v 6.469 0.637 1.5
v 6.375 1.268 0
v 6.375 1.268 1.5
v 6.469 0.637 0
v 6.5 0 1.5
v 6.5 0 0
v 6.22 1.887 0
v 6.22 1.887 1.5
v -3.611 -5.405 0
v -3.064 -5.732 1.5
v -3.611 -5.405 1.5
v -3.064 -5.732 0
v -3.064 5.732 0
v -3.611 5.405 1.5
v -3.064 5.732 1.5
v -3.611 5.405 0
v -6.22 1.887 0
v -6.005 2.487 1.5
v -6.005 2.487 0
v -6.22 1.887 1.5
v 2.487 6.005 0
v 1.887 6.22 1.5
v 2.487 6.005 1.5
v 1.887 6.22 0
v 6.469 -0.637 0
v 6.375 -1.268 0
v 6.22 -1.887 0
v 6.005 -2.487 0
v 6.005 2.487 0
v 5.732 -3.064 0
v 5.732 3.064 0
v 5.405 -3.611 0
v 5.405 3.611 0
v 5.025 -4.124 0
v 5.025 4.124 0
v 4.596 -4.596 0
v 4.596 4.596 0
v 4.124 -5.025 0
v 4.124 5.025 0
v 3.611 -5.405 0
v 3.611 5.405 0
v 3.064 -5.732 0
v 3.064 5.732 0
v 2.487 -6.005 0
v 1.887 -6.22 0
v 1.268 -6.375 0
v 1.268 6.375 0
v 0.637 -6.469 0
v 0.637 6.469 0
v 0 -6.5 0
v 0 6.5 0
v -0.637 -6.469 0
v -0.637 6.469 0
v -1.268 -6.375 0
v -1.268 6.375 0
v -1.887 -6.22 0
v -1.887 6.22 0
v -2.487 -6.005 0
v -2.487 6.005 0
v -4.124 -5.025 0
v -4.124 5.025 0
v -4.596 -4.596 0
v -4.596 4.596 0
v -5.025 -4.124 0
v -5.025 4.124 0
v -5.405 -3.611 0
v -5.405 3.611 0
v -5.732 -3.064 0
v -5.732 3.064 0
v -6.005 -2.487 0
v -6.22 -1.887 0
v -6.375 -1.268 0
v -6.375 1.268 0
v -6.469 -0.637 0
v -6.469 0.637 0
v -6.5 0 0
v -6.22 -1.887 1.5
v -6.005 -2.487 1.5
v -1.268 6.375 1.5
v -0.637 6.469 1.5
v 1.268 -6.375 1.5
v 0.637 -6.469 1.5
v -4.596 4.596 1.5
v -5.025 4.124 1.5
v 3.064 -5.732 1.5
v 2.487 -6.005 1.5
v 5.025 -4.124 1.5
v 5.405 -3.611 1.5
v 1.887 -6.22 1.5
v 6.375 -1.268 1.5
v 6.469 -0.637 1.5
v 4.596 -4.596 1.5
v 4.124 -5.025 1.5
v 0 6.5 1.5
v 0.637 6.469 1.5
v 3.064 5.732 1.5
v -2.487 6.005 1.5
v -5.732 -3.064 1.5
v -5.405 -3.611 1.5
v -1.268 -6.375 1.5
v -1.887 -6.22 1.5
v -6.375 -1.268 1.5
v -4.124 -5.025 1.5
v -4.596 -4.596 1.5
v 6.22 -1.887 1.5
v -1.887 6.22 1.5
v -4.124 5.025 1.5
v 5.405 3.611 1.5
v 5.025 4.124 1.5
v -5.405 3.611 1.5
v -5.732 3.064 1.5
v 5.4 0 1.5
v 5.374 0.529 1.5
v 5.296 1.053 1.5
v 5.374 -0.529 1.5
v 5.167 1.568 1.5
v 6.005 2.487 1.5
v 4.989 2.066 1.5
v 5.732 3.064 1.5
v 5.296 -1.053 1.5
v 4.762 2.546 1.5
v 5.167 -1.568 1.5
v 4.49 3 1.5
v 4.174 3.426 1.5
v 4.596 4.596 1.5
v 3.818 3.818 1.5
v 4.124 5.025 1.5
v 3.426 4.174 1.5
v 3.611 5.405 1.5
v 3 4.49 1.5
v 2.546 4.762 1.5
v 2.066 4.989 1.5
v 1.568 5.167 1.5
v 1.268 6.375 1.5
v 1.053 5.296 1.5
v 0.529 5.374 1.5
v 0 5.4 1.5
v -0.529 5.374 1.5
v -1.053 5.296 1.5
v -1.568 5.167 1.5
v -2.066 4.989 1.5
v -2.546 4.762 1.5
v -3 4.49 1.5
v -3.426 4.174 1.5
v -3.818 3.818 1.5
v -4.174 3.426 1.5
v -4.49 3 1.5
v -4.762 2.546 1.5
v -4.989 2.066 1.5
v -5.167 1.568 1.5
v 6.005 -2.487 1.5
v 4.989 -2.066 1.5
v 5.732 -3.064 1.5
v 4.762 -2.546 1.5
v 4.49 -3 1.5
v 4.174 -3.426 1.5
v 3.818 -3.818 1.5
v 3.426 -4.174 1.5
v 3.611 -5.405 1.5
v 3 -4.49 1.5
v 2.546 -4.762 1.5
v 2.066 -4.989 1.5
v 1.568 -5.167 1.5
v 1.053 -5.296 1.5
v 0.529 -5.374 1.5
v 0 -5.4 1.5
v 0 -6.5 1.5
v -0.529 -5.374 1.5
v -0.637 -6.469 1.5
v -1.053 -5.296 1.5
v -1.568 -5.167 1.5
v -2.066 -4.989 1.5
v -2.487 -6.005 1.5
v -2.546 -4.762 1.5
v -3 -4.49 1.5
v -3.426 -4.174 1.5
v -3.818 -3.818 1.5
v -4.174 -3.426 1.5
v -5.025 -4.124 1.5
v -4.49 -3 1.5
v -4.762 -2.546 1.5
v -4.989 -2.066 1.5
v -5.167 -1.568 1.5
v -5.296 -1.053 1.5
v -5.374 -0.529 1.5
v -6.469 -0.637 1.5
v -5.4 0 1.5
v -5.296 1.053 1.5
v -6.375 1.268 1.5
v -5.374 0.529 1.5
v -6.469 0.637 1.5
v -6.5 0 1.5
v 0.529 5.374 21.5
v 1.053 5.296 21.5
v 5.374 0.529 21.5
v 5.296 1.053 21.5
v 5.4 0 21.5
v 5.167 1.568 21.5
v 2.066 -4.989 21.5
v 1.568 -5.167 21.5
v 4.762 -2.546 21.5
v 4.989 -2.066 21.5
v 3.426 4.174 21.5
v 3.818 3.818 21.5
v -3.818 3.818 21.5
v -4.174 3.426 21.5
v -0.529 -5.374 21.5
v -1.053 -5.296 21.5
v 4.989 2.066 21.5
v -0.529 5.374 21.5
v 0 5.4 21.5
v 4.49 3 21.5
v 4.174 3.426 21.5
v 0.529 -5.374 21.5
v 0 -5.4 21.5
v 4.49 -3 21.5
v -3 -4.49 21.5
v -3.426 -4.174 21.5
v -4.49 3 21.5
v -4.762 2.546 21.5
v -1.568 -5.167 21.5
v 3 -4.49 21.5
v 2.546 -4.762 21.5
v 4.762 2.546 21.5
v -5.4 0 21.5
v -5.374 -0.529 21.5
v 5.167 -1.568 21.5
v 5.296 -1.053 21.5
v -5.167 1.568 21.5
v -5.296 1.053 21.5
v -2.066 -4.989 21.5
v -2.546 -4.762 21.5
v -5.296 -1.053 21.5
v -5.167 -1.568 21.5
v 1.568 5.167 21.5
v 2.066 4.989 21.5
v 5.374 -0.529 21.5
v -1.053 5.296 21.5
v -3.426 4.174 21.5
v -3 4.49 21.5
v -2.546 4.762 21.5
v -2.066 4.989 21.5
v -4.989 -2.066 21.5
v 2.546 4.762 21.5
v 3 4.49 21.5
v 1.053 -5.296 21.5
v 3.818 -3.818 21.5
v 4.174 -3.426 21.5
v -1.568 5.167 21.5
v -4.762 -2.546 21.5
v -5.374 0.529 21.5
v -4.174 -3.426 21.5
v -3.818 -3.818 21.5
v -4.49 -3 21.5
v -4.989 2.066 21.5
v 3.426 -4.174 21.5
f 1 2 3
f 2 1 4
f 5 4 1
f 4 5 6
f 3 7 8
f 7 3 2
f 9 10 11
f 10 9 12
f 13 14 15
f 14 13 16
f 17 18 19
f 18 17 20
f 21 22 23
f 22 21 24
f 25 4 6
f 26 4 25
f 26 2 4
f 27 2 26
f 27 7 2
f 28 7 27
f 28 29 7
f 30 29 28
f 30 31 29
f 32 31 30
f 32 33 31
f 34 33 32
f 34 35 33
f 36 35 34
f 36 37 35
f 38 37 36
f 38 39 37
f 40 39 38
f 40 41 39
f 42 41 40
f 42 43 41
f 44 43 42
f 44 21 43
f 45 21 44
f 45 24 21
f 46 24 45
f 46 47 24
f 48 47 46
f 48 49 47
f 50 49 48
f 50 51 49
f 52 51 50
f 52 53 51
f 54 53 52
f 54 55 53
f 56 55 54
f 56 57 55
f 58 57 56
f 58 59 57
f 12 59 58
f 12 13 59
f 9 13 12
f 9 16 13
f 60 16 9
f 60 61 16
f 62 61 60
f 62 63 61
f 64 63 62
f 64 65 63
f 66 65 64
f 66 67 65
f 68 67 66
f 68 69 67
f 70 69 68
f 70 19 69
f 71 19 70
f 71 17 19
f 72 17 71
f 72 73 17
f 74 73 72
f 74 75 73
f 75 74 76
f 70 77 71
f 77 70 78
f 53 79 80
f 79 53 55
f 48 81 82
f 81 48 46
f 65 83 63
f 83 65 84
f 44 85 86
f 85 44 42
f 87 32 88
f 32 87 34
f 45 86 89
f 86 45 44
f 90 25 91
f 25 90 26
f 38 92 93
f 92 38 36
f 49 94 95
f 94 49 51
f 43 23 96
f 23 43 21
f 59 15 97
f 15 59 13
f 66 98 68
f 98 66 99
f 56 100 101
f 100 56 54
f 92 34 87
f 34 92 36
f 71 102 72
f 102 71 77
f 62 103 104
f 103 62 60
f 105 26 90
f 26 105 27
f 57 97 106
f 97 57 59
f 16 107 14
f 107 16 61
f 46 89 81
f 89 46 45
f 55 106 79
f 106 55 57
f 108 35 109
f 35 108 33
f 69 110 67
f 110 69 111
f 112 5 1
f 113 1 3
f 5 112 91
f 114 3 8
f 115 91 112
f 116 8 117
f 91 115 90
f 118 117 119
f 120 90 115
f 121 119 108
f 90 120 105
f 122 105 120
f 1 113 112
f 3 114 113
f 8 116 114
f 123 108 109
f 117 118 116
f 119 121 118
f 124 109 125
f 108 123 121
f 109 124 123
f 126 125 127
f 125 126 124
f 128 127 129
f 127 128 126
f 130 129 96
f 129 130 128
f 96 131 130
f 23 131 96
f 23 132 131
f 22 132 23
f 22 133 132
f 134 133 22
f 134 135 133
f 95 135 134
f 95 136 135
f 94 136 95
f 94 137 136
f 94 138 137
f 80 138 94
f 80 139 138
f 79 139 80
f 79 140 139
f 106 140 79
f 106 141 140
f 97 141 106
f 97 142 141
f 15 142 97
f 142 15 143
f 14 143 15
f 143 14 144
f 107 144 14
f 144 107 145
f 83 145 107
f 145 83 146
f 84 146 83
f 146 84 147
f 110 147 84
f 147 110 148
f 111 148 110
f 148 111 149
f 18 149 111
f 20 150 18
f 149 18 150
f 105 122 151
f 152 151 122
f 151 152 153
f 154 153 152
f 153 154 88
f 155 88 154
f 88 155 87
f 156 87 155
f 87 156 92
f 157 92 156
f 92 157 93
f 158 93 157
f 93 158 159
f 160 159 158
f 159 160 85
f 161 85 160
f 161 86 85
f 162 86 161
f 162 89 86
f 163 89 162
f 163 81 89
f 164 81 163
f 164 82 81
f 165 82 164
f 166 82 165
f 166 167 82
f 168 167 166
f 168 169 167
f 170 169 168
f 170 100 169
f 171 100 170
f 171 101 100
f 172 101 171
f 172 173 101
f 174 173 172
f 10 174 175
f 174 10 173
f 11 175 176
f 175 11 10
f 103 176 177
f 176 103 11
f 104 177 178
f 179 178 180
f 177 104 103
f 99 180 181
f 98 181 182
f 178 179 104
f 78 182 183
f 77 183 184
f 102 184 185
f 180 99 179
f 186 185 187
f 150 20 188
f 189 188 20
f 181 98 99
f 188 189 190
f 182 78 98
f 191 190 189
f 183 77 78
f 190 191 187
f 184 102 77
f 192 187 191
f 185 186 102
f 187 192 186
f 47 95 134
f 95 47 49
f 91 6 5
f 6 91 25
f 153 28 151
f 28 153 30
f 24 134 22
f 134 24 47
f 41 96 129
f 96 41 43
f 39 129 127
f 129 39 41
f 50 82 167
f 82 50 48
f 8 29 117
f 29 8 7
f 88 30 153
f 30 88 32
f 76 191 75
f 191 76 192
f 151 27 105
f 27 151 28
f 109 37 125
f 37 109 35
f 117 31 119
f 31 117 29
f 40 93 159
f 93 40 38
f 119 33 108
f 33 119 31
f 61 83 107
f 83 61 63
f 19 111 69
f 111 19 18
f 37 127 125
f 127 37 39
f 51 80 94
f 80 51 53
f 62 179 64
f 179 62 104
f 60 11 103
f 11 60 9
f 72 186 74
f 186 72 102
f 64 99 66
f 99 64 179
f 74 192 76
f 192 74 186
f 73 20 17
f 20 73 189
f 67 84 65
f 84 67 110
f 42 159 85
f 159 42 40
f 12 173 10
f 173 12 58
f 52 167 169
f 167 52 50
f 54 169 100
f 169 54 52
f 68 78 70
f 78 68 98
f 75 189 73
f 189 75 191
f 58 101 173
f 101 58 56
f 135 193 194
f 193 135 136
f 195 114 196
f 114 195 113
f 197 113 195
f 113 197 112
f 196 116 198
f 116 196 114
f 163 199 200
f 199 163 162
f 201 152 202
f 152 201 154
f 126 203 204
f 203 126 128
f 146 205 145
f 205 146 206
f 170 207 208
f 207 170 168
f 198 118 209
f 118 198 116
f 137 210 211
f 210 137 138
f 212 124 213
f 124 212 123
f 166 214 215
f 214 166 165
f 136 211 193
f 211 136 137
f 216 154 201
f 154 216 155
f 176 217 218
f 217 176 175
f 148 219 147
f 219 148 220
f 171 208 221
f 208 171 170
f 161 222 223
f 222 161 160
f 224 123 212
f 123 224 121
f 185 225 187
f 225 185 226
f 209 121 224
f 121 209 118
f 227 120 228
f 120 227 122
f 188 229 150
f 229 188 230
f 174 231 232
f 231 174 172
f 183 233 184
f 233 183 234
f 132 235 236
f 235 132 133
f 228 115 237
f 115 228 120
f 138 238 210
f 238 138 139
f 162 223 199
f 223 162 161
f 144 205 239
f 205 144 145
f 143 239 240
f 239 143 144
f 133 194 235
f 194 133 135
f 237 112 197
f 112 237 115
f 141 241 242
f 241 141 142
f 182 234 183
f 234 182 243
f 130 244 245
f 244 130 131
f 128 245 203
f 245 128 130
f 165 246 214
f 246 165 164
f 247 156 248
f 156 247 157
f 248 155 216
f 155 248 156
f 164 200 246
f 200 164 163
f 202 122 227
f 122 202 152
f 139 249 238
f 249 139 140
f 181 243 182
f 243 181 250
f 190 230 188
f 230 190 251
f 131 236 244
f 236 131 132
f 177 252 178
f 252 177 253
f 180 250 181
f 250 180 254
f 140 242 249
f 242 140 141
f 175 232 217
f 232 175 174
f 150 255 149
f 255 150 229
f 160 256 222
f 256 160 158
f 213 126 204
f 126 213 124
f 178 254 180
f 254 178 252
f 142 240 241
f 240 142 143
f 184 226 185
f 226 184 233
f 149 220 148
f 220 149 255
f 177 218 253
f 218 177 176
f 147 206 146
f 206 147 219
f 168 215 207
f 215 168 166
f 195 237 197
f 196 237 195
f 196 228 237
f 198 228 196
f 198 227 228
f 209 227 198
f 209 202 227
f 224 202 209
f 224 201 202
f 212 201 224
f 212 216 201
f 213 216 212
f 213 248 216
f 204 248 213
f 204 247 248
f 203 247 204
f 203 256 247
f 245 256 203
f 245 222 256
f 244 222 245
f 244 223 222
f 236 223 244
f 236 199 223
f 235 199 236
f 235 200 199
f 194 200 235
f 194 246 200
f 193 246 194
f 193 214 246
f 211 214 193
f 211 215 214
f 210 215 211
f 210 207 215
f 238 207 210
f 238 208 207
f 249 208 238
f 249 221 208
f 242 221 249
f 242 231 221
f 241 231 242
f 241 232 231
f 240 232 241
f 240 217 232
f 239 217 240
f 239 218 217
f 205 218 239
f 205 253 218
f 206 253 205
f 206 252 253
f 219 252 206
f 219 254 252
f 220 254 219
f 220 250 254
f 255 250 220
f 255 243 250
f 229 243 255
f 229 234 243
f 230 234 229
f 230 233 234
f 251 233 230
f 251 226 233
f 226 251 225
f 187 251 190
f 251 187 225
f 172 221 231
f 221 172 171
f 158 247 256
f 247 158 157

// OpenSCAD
// Adapter sleeve: 0.2 mL PCR tube to 1.5 mL rack hole
// Dimensions measured with calipers

// Collar (rests on build plate)
collar_diameter = 13;
collar_thickness = 1.5;

// Sleeve body
sleeve_outer_diameter = 10.8;
sleeve_height = 21.5; // total height from z=0 to z=21.5

// Bore (through hole)
bore_diameter = 6.2;

// Print orientation: collar on bed (z=0 to 1.5), sleeve rises to z=21.5
// Centred on origin in X and Y

$fn = 64;

union() {
    // Collar: cylinder sitting on z=0, thickness 1.5 mm
    translate([0, 0, 0])
        cylinder(h = collar_thickness, r = collar_diameter / 2, center = false);

    // Sleeve body: starts at z=1.5, rises to z=21.5
    // Height of sleeve portion = 21.5 - 1.5 = 20 mm
    translate([0, 0, collar_thickness])
        cylinder(h = sleeve_height - collar_thickness, r = sleeve_outer_diameter / 2, center = false);
}

// Bore: straight through hole, open at both ends
// Must extend slightly past top and bottom to avoid coplanar faces
difference() {
    // (The union above is implicitly the base; we subtract the bore)
}

// Re-do as a single difference for correctness
difference() {
    union() {
        // Collar
        translate([0, 0, 0])
            cylinder(h = collar_thickness, r = collar_diameter / 2, center = false);

        // Sleeve body
        translate([0, 0, collar_thickness])
            cylinder(h = sleeve_height - collar_thickness, r = sleeve_outer_diameter / 2, center = false);
    }

    // Bore: extends 1 mm below z=0 and 1 mm above z=21.5 to ensure clean cut
    translate([0, 0, -1])
        cylinder(h = sleeve_height + 2, r = bore_diameter / 2, center = false);
}
